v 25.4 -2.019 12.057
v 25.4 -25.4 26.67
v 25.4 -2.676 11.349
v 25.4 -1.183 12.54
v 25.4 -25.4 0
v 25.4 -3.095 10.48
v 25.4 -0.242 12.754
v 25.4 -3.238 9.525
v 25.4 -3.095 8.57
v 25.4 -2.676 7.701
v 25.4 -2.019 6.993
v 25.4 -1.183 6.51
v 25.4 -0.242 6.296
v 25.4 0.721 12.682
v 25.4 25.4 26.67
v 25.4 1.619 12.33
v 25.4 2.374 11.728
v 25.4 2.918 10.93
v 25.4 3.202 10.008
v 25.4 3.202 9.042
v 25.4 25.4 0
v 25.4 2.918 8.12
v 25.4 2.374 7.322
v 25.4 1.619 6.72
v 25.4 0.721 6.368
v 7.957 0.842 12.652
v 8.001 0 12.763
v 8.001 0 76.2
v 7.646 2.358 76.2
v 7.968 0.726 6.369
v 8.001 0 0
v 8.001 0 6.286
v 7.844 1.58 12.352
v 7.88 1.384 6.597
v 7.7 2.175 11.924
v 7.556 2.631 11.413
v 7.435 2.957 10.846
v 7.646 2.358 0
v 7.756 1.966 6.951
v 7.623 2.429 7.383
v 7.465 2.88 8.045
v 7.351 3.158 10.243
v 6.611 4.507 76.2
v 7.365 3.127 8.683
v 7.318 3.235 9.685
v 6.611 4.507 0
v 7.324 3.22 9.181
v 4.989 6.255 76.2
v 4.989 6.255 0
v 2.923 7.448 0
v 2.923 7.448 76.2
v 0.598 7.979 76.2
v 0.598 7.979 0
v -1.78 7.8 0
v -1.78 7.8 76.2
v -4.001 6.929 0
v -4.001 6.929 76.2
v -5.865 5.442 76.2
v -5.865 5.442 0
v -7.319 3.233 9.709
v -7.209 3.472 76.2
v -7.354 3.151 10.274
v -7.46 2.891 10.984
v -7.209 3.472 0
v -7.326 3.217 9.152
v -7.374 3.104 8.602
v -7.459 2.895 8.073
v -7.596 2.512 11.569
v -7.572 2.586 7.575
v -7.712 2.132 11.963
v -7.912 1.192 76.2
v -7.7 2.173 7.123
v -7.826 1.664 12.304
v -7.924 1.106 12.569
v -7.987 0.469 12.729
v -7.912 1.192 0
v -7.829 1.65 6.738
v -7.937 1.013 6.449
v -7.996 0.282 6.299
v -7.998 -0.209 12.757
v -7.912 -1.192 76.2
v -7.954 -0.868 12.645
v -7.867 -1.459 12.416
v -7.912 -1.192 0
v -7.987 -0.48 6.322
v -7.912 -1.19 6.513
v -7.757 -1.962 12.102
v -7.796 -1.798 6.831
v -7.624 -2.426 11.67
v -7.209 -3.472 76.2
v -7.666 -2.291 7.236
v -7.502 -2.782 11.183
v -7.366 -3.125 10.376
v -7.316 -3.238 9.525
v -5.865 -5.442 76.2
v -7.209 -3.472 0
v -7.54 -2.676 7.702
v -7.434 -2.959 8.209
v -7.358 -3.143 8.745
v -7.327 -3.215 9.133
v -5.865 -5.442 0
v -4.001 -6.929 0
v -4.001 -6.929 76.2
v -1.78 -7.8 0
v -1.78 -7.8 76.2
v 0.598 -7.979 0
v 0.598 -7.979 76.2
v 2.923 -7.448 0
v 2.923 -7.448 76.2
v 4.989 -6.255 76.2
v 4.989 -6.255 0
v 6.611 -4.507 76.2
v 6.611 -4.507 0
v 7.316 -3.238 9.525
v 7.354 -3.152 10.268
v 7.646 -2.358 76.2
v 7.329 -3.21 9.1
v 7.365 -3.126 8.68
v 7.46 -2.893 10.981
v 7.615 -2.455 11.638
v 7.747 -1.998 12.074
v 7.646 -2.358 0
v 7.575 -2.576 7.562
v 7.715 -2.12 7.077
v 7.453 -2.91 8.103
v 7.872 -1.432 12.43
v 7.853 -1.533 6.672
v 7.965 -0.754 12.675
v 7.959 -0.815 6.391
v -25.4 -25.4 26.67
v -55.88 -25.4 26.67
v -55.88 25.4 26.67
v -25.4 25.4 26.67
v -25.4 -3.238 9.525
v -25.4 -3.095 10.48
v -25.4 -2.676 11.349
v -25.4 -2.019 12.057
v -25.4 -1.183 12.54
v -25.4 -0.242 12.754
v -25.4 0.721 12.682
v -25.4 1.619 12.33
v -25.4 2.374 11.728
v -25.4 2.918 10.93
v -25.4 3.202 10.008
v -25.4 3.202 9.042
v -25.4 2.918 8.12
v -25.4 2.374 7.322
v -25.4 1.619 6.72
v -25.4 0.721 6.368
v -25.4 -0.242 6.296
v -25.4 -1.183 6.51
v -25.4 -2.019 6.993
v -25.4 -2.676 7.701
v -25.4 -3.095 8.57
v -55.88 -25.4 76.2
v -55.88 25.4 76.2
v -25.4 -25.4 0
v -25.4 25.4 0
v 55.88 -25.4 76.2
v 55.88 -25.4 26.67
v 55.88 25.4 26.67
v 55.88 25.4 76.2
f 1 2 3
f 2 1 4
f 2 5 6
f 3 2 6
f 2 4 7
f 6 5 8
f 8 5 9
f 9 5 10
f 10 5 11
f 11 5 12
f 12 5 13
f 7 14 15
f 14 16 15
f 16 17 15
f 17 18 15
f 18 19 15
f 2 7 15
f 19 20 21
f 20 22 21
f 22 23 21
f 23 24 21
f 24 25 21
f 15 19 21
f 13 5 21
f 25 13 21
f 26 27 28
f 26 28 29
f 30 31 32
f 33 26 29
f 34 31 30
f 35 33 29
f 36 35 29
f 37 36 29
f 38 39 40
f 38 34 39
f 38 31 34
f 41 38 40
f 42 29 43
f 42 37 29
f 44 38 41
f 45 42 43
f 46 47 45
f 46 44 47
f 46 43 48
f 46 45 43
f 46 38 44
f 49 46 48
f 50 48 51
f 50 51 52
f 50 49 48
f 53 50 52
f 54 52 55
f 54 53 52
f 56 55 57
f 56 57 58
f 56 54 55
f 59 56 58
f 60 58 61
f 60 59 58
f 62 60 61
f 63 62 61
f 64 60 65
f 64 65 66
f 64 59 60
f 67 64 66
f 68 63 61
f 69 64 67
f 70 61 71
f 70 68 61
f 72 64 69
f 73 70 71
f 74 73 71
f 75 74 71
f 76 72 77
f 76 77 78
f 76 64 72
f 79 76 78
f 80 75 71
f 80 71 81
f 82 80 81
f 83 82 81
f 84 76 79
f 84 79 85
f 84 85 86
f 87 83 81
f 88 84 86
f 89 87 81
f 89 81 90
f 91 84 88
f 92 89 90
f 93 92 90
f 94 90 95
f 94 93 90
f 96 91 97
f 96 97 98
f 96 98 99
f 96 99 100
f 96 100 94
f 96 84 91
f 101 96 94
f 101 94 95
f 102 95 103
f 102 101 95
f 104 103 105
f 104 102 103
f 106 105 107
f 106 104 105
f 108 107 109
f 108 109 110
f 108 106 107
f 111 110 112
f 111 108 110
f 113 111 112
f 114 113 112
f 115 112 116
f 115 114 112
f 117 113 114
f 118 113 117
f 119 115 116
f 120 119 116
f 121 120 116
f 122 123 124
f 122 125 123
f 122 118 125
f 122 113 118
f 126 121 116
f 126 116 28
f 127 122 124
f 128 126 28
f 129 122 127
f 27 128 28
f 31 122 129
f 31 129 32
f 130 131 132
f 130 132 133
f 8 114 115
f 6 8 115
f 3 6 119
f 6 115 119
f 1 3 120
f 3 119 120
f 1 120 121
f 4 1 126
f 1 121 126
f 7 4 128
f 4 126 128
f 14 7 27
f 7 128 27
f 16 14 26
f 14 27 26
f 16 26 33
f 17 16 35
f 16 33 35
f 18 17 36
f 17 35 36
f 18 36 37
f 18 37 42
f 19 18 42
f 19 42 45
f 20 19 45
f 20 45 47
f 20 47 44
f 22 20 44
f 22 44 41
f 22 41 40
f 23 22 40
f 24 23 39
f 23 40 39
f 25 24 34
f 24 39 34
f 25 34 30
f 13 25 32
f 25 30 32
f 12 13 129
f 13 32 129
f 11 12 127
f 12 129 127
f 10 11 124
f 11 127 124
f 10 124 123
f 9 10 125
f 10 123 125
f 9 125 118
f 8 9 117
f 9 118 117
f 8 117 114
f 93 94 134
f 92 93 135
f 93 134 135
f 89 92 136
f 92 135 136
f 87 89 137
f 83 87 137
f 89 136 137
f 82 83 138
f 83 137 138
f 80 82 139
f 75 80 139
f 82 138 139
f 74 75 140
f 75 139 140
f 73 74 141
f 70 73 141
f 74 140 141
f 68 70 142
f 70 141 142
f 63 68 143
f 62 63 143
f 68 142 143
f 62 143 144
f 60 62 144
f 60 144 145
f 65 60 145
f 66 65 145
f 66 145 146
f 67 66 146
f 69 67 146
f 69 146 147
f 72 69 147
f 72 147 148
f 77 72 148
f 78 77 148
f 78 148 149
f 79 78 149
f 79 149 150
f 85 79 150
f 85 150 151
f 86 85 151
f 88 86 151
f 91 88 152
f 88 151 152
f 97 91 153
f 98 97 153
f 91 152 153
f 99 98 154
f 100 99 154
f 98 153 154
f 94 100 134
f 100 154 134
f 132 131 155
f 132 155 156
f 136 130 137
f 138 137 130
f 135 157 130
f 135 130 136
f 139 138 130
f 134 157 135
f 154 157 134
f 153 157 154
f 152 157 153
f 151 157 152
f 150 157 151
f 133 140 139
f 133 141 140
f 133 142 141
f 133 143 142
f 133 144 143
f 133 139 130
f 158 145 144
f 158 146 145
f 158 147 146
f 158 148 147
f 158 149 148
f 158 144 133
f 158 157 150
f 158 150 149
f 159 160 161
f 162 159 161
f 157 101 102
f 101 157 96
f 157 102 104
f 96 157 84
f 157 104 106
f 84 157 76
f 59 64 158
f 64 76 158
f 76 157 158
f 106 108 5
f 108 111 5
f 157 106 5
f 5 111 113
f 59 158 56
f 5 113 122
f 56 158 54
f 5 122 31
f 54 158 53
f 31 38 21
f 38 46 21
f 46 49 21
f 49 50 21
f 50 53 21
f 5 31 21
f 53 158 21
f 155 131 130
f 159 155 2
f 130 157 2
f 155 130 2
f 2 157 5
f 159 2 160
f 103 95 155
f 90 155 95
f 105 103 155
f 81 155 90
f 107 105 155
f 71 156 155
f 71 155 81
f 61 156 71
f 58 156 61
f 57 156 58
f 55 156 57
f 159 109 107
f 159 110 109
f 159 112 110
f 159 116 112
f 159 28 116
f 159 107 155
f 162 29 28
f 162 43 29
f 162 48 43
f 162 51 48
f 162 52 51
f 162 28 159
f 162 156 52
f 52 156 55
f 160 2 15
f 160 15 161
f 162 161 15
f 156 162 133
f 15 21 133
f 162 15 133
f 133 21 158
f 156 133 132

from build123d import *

# Parameters (mm, degrees)
F0_W     = 50.8
F0_H     = 50.8
F0_R     = 8.001
F1_DEPTH = 26.67
F2_W     = 30.48
F2_H     = 50.8
F2_W_2   = 50.8
F2_R     = 8.001
F3_DEPTH = 49.53
F4_R     = 3.2385
F5_DEPTH = 81.281


with BuildPart() as f1:
    # F0 (on Top) → F1 (new body)
    with BuildSketch(Plane.XY):
        Rectangle(F0_W, F0_H)
        Circle(F0_R, mode=Mode.SUBTRACT)
    extrude(amount=F1_DEPTH)

    # F2 (on face) → F3 (join)
    with BuildSketch(Plane.XY.offset(26.67)):
        with Locations((-40.64, 0)):
            Rectangle(F2_W, F2_H)
        Rectangle(F2_W_2, F2_H)
        Circle(F2_R, mode=Mode.SUBTRACT)
        with Locations((40.64, 0)):
            Rectangle(F2_W, F2_H)
    extrude(amount=F3_DEPTH)

    # F4 (on face) → F5 (cut, through all)
    with BuildSketch(Plane(origin=(-25.4, 0, 0), x_dir=(0, -1, 0), z_dir=(-1, 0, 0))):
        with Locations((0, 9.525)):
            Circle(F4_R)
    extrude(amount=-F5_DEPTH, mode=Mode.SUBTRACT)


solid = f1.part
